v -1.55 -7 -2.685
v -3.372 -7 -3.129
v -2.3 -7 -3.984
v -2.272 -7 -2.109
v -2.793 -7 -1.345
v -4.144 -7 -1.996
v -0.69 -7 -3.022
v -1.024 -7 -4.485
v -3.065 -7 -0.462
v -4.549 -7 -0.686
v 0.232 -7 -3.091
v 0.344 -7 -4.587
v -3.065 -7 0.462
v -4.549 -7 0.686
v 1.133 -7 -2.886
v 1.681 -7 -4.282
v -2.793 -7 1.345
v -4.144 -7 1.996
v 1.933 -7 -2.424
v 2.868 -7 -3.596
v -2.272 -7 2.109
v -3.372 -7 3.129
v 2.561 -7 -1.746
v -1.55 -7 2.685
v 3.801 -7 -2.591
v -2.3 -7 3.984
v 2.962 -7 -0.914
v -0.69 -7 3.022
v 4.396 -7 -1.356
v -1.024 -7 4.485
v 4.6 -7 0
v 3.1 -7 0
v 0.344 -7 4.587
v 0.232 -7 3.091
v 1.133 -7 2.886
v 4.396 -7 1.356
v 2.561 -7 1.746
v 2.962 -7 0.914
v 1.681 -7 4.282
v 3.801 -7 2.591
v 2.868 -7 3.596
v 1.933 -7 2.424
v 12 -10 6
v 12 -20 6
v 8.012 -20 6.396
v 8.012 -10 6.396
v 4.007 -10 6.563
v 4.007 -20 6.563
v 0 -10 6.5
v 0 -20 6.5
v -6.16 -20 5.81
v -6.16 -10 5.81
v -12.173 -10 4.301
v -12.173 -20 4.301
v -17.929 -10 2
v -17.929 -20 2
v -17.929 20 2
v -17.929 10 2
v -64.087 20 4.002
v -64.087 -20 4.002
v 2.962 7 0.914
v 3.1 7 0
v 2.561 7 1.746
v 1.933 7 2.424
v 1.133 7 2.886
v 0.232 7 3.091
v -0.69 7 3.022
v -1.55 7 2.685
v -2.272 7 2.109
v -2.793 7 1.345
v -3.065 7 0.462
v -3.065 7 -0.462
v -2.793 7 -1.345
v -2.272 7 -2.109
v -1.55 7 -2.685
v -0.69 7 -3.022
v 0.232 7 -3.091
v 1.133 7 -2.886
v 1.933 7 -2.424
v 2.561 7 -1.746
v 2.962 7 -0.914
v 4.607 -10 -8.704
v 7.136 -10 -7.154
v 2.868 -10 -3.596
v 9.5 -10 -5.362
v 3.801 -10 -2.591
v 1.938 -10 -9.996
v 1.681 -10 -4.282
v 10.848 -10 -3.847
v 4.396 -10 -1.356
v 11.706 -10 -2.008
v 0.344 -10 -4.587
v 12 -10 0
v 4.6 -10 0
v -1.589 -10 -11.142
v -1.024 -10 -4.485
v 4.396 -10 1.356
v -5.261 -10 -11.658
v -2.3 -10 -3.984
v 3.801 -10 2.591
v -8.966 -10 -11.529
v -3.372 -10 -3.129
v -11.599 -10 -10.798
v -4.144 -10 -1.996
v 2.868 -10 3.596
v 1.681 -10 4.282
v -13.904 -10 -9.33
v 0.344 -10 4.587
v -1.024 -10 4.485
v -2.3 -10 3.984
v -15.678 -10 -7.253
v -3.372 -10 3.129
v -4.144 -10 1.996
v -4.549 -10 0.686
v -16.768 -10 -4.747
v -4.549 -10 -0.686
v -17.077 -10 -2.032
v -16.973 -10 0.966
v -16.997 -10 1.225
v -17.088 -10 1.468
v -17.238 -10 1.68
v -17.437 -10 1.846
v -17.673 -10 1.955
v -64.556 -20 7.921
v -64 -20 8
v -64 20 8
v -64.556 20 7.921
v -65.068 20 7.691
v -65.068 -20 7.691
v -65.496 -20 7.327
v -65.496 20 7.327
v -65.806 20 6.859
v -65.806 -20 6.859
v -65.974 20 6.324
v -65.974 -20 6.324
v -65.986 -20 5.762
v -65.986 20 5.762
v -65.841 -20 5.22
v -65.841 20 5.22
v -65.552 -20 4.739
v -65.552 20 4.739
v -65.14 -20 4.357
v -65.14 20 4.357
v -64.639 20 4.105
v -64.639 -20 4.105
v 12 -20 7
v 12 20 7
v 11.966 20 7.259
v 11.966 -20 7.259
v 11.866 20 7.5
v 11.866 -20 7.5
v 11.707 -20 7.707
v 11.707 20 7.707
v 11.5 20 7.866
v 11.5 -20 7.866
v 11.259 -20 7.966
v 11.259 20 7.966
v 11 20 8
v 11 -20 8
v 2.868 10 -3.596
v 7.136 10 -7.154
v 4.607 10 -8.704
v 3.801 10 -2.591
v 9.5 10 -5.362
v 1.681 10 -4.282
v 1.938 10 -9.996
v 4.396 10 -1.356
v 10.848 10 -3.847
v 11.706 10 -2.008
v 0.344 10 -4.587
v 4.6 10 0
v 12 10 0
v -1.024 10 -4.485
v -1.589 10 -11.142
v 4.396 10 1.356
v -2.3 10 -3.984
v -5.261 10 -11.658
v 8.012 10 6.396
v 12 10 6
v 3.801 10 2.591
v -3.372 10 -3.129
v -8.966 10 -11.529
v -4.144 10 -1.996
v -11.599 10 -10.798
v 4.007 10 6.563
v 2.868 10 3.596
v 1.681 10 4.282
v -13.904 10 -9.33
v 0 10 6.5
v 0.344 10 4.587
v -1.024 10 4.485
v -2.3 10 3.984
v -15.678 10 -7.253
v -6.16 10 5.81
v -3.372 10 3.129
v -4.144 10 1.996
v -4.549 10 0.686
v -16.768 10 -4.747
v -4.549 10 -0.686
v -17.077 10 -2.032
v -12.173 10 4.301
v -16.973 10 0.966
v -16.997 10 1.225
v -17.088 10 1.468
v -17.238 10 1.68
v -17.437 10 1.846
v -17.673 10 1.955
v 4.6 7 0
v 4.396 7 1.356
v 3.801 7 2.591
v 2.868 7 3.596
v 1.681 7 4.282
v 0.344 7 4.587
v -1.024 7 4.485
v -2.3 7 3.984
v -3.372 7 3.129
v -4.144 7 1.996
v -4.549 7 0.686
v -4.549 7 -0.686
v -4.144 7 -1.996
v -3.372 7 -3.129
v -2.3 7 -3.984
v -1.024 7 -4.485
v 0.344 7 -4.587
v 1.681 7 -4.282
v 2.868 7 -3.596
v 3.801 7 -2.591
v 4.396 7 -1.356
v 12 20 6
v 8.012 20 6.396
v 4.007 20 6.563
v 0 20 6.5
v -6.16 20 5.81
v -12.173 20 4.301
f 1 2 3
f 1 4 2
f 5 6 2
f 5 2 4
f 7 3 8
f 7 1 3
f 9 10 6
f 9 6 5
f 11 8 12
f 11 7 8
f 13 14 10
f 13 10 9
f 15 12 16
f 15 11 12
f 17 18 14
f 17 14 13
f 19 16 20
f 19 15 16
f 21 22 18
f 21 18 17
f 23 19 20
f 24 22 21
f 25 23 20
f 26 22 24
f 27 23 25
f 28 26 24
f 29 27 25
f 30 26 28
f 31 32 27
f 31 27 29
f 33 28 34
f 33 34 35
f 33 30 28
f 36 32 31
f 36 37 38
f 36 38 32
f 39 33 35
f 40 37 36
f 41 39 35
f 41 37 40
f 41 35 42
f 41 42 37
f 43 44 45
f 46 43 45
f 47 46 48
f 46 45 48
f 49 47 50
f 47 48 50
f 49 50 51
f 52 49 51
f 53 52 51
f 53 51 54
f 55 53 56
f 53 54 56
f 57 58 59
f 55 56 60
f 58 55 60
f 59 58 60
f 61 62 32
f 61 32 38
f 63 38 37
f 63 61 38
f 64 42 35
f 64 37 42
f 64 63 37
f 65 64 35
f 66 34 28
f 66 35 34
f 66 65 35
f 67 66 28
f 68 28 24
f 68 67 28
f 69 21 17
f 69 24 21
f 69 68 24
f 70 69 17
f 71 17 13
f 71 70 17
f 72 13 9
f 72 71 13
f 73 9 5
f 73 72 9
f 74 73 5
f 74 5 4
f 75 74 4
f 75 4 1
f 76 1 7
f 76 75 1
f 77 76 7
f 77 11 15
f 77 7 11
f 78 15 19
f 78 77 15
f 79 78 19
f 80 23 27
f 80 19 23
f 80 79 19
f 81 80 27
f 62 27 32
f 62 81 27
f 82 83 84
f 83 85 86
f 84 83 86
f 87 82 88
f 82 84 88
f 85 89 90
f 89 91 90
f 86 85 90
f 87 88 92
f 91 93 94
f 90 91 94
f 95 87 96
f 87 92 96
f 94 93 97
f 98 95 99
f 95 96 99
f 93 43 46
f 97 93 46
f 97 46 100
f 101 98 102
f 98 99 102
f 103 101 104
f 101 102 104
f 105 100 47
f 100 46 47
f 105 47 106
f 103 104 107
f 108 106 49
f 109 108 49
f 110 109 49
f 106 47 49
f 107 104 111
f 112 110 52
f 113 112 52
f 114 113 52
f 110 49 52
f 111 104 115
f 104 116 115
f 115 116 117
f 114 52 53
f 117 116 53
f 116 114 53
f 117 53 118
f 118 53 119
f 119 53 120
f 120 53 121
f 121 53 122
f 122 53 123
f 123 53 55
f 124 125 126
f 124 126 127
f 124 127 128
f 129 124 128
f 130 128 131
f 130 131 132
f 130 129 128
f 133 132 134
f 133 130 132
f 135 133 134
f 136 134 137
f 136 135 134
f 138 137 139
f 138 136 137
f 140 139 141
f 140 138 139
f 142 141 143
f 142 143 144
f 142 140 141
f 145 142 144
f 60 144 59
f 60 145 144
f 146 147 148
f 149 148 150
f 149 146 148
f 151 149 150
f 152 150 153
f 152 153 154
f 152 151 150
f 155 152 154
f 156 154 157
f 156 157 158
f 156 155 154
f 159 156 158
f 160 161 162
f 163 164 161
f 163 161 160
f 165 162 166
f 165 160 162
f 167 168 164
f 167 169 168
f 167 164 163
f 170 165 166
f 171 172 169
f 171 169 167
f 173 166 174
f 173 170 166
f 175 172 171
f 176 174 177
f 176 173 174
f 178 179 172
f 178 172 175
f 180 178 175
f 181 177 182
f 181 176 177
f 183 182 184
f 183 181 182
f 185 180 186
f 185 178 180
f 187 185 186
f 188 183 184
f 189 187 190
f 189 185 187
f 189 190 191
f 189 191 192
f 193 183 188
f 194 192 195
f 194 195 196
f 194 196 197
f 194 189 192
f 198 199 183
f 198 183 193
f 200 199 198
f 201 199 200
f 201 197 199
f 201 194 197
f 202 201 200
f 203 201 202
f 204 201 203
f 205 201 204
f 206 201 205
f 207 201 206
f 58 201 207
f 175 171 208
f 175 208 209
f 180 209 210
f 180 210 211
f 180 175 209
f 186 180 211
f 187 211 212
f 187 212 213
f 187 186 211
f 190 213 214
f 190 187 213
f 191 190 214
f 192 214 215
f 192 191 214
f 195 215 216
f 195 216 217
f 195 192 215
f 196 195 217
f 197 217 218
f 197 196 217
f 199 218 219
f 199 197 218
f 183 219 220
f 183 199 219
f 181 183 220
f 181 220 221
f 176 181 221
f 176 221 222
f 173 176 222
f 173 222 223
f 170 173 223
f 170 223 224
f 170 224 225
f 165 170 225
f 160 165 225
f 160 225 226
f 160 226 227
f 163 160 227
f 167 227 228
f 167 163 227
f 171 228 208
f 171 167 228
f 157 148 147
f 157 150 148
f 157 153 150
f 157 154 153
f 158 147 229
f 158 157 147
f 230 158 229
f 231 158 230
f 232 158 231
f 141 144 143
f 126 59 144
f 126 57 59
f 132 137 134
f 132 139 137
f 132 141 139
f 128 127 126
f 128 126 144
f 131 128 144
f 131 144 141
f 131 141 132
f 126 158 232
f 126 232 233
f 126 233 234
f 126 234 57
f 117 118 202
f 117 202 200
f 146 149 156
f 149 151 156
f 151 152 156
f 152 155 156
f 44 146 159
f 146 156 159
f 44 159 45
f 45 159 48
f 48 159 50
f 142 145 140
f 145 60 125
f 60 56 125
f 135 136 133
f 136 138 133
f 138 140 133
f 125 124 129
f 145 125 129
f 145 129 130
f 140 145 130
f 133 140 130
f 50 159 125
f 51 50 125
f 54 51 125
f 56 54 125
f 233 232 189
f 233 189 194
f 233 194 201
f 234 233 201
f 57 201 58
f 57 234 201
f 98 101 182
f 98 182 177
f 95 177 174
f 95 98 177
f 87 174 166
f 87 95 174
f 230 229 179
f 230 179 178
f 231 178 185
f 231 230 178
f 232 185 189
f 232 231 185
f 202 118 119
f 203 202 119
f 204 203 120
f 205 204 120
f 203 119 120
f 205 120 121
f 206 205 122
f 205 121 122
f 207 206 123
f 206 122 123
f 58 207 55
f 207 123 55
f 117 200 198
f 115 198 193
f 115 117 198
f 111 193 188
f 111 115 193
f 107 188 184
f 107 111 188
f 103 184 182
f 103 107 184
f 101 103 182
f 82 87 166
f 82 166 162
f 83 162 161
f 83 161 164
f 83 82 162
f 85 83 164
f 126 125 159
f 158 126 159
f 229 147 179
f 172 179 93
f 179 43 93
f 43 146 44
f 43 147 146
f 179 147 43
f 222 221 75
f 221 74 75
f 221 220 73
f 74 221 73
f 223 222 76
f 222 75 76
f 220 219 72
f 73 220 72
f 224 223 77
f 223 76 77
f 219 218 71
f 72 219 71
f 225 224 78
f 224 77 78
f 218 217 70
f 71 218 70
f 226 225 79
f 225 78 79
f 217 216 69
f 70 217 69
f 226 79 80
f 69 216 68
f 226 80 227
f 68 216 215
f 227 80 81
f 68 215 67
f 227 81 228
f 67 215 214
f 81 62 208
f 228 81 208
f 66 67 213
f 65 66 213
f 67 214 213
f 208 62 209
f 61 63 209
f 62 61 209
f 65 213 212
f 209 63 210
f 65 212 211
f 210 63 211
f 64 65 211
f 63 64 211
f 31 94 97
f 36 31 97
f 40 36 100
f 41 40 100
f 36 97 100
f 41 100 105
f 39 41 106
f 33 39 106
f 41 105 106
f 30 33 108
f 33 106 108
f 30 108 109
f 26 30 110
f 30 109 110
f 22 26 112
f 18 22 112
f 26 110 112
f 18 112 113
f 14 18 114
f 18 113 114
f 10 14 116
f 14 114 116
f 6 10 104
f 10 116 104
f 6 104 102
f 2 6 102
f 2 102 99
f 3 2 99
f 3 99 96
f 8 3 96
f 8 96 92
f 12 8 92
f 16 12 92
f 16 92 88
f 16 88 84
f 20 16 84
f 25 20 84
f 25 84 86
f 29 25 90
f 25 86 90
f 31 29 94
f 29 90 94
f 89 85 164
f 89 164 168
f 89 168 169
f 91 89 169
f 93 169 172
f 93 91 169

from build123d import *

# Parameters (mm, degrees)
SKETCH130_R     = 3.1
PAD039_DEPTH    = 20
POCKET048_DEPTH = 10
SKETCH131_R     = 4.6
POCKET047_DEPTH = 3


with BuildPart() as part:
    # Sketch130 → Pad039 (new body, symmetric)
    with BuildSketch(Plane.XZ):
        with BuildLine():
            Line((-64, 8), (11, 8))
            ThreePointArc((12, 7), (11.707107, 7.707107), (11, 8))
            Line((12, 7), (12, 0))
            ThreePointArc((9.499513, -5.362311), (11.344155, -2.958328), (12, 0))
            ThreePointArc((1.937819, -9.996123), (5.890842, -7.960183), (9.499513, -5.362311))
            ThreePointArc((-8.966462, -11.52862), (-3.413443, -11.48016), (1.937819, -9.996123))
            ThreePointArc((-17.077228, -2.032133), (-14.868336, -8.357429), (-8.966462, -11.52862))
            Line((-16.97253, 0.96604), (-17.077228, -2.032133))
            ThreePointArc((-16.97253, 0.96604), (-17.237697, 1.679846), (-17.928591, 2))
            Line((-17.928591, 2), (-64.086659, 4.001878))
            ThreePointArc((-64, 8), (-65.99953, 6.04334), (-64.086659, 4.001878))
        make_face()
        Circle(SKETCH130_R, mode=Mode.SUBTRACT)
    extrude(amount=PAD039_DEPTH, both=True)

    # Sketch133 → Pocket048 (cut)
    with BuildSketch(Plane.XZ.offset(20)):
        with BuildLine():
            Line((12, 6), (12, -34))
            Line((12, -34), (-17.928591, -34))
            Line((-17.928591, 2), (-17.928591, -34))
            ThreePointArc((0, 6.5), (-9.19194, 5.156963), (-17.928591, 2))
            ThreePointArc((12, 6), (6.010743, 6.507841), (0, 6.5))
        make_face()
    pocket048 = extrude(amount=-POCKET048_DEPTH, mode=Mode.SUBTRACT)

    # Sketch131 → Pocket047 (cut)
    with BuildSketch(Plane.XZ.offset(10)):
        Circle(SKETCH131_R)
    pocket047 = extrude(amount=-POCKET047_DEPTH, mode=Mode.SUBTRACT)

    # Mirrored009: Pocket047, Pocket048 across XZ
    add(pocket047.mirror(Plane.XZ), mode=Mode.SUBTRACT)
    add(pocket048.mirror(Plane.XZ), mode=Mode.SUBTRACT)


solid = part.part
